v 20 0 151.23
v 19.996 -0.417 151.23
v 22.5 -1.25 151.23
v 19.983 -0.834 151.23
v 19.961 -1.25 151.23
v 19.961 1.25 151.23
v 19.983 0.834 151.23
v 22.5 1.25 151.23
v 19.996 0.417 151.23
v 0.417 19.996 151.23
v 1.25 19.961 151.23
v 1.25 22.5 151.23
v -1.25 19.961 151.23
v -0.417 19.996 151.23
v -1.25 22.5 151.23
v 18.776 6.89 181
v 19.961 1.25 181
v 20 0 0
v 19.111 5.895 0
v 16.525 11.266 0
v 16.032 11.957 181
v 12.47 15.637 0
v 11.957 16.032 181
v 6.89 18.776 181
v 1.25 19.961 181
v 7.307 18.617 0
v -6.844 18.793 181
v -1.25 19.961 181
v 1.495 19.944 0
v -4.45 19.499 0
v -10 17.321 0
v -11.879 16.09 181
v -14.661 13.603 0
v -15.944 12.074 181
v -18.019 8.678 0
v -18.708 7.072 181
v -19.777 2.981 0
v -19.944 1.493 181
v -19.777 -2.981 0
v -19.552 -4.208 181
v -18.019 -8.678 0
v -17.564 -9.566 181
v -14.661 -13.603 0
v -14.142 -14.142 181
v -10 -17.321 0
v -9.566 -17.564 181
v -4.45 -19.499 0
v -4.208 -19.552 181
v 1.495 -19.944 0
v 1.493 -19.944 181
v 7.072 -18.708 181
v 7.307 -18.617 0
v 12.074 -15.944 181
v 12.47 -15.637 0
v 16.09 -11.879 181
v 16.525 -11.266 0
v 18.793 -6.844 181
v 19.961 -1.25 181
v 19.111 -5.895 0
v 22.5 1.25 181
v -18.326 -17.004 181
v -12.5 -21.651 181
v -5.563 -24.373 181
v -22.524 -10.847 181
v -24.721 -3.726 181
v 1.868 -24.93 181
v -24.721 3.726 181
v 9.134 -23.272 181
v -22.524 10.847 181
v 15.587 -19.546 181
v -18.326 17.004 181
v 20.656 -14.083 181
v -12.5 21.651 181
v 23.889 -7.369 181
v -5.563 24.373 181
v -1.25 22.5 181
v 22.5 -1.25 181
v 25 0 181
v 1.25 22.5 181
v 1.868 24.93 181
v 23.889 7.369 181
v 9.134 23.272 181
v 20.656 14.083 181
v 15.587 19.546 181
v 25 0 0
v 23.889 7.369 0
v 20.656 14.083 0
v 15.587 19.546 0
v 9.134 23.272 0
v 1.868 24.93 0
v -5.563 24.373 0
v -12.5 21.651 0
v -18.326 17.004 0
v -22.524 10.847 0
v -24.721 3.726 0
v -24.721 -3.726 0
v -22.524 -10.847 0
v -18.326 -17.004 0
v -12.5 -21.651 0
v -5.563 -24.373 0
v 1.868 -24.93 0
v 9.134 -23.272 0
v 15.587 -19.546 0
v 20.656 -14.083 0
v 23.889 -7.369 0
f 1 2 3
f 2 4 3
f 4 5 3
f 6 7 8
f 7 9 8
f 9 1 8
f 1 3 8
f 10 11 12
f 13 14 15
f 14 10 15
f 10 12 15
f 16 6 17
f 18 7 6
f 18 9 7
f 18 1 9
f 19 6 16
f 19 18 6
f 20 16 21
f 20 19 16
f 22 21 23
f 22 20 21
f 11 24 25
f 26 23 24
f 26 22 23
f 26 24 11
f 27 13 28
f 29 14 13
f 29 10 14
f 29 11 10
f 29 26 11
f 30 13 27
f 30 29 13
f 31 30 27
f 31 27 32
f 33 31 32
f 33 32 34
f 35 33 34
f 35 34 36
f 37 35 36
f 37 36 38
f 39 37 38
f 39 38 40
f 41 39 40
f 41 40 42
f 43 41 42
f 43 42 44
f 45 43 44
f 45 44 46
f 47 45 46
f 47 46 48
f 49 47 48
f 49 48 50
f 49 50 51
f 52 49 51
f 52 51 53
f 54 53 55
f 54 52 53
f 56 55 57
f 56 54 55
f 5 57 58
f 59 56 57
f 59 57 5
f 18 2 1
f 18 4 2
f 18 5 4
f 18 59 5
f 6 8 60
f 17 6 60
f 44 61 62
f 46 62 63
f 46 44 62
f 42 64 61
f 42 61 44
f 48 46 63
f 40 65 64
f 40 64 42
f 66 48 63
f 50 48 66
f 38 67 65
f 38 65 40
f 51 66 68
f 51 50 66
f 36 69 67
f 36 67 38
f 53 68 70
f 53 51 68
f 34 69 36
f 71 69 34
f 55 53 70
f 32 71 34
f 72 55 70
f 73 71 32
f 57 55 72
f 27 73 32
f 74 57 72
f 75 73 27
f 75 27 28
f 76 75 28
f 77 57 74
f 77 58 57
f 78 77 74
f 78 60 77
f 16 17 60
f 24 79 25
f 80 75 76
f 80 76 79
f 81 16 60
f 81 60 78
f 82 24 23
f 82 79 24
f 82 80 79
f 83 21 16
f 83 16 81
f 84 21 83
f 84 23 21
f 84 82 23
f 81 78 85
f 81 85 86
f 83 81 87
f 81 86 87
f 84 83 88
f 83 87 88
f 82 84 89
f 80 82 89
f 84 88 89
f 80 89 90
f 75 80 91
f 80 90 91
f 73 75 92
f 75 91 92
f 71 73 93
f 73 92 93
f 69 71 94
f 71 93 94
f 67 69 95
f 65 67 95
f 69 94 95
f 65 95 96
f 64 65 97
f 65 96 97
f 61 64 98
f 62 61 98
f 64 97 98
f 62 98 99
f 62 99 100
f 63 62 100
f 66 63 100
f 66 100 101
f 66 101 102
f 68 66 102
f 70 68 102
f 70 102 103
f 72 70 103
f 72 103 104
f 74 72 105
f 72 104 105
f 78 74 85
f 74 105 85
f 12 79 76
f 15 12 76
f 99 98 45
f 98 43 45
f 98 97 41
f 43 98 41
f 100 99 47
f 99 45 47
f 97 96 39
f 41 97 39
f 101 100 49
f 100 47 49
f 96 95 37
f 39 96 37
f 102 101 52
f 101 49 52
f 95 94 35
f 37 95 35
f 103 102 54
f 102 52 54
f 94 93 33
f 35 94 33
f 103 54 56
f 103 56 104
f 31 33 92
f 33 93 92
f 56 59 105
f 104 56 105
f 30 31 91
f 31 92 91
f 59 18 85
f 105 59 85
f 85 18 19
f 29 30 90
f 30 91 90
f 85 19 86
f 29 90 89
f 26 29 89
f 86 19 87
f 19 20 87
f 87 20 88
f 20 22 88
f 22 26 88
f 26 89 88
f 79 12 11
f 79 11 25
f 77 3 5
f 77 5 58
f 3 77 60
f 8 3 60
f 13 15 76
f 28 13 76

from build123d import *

# Parameters (mm, degrees)
SKETCH1_R           = 25
SKETCH1_R_2         = 20
BOSS_EXTRUDE1_DEPTH = 181
SKETCH5_W           = 2.5
SKETCH5_H           = 30
CUT_EXTRUDE2_DEPTH  = 6
CIRPATTERN8_COUNT   = 2
CIRPATTERN8_ANGLE   = 90


with BuildPart() as part:
    # Sketch1 → Boss-Extrude1 (new body)
    with BuildSketch(Plane.XY):
        Circle(SKETCH1_R)
        Circle(SKETCH1_R_2, mode=Mode.SUBTRACT)
    extrude(amount=BOSS_EXTRUDE1_DEPTH)

    # Sketch5 → Cut-Extrude2 (cut)
    with BuildSketch(Plane(origin=(0, 22.5, 0), x_dir=(-1, 0, 0), z_dir=(0, 1, 0))):
        with Locations((0, 166.230203819)):
            Rectangle(SKETCH5_W, SKETCH5_H)
    cut_extrude2 = extrude(amount=-CUT_EXTRUDE2_DEPTH, mode=Mode.SUBTRACT)

    # CirPattern8: Cut-Extrude2 ×2 about axis
    cirpattern8_axis = Axis((0, 0, 0), (0, 0, -1))
    for i in range(1, CIRPATTERN8_COUNT):
        add(cut_extrude2.rotate(cirpattern8_axis, i * CIRPATTERN8_ANGLE / (CIRPATTERN8_COUNT - 1)), mode=Mode.SUBTRACT)


solid = part.part
